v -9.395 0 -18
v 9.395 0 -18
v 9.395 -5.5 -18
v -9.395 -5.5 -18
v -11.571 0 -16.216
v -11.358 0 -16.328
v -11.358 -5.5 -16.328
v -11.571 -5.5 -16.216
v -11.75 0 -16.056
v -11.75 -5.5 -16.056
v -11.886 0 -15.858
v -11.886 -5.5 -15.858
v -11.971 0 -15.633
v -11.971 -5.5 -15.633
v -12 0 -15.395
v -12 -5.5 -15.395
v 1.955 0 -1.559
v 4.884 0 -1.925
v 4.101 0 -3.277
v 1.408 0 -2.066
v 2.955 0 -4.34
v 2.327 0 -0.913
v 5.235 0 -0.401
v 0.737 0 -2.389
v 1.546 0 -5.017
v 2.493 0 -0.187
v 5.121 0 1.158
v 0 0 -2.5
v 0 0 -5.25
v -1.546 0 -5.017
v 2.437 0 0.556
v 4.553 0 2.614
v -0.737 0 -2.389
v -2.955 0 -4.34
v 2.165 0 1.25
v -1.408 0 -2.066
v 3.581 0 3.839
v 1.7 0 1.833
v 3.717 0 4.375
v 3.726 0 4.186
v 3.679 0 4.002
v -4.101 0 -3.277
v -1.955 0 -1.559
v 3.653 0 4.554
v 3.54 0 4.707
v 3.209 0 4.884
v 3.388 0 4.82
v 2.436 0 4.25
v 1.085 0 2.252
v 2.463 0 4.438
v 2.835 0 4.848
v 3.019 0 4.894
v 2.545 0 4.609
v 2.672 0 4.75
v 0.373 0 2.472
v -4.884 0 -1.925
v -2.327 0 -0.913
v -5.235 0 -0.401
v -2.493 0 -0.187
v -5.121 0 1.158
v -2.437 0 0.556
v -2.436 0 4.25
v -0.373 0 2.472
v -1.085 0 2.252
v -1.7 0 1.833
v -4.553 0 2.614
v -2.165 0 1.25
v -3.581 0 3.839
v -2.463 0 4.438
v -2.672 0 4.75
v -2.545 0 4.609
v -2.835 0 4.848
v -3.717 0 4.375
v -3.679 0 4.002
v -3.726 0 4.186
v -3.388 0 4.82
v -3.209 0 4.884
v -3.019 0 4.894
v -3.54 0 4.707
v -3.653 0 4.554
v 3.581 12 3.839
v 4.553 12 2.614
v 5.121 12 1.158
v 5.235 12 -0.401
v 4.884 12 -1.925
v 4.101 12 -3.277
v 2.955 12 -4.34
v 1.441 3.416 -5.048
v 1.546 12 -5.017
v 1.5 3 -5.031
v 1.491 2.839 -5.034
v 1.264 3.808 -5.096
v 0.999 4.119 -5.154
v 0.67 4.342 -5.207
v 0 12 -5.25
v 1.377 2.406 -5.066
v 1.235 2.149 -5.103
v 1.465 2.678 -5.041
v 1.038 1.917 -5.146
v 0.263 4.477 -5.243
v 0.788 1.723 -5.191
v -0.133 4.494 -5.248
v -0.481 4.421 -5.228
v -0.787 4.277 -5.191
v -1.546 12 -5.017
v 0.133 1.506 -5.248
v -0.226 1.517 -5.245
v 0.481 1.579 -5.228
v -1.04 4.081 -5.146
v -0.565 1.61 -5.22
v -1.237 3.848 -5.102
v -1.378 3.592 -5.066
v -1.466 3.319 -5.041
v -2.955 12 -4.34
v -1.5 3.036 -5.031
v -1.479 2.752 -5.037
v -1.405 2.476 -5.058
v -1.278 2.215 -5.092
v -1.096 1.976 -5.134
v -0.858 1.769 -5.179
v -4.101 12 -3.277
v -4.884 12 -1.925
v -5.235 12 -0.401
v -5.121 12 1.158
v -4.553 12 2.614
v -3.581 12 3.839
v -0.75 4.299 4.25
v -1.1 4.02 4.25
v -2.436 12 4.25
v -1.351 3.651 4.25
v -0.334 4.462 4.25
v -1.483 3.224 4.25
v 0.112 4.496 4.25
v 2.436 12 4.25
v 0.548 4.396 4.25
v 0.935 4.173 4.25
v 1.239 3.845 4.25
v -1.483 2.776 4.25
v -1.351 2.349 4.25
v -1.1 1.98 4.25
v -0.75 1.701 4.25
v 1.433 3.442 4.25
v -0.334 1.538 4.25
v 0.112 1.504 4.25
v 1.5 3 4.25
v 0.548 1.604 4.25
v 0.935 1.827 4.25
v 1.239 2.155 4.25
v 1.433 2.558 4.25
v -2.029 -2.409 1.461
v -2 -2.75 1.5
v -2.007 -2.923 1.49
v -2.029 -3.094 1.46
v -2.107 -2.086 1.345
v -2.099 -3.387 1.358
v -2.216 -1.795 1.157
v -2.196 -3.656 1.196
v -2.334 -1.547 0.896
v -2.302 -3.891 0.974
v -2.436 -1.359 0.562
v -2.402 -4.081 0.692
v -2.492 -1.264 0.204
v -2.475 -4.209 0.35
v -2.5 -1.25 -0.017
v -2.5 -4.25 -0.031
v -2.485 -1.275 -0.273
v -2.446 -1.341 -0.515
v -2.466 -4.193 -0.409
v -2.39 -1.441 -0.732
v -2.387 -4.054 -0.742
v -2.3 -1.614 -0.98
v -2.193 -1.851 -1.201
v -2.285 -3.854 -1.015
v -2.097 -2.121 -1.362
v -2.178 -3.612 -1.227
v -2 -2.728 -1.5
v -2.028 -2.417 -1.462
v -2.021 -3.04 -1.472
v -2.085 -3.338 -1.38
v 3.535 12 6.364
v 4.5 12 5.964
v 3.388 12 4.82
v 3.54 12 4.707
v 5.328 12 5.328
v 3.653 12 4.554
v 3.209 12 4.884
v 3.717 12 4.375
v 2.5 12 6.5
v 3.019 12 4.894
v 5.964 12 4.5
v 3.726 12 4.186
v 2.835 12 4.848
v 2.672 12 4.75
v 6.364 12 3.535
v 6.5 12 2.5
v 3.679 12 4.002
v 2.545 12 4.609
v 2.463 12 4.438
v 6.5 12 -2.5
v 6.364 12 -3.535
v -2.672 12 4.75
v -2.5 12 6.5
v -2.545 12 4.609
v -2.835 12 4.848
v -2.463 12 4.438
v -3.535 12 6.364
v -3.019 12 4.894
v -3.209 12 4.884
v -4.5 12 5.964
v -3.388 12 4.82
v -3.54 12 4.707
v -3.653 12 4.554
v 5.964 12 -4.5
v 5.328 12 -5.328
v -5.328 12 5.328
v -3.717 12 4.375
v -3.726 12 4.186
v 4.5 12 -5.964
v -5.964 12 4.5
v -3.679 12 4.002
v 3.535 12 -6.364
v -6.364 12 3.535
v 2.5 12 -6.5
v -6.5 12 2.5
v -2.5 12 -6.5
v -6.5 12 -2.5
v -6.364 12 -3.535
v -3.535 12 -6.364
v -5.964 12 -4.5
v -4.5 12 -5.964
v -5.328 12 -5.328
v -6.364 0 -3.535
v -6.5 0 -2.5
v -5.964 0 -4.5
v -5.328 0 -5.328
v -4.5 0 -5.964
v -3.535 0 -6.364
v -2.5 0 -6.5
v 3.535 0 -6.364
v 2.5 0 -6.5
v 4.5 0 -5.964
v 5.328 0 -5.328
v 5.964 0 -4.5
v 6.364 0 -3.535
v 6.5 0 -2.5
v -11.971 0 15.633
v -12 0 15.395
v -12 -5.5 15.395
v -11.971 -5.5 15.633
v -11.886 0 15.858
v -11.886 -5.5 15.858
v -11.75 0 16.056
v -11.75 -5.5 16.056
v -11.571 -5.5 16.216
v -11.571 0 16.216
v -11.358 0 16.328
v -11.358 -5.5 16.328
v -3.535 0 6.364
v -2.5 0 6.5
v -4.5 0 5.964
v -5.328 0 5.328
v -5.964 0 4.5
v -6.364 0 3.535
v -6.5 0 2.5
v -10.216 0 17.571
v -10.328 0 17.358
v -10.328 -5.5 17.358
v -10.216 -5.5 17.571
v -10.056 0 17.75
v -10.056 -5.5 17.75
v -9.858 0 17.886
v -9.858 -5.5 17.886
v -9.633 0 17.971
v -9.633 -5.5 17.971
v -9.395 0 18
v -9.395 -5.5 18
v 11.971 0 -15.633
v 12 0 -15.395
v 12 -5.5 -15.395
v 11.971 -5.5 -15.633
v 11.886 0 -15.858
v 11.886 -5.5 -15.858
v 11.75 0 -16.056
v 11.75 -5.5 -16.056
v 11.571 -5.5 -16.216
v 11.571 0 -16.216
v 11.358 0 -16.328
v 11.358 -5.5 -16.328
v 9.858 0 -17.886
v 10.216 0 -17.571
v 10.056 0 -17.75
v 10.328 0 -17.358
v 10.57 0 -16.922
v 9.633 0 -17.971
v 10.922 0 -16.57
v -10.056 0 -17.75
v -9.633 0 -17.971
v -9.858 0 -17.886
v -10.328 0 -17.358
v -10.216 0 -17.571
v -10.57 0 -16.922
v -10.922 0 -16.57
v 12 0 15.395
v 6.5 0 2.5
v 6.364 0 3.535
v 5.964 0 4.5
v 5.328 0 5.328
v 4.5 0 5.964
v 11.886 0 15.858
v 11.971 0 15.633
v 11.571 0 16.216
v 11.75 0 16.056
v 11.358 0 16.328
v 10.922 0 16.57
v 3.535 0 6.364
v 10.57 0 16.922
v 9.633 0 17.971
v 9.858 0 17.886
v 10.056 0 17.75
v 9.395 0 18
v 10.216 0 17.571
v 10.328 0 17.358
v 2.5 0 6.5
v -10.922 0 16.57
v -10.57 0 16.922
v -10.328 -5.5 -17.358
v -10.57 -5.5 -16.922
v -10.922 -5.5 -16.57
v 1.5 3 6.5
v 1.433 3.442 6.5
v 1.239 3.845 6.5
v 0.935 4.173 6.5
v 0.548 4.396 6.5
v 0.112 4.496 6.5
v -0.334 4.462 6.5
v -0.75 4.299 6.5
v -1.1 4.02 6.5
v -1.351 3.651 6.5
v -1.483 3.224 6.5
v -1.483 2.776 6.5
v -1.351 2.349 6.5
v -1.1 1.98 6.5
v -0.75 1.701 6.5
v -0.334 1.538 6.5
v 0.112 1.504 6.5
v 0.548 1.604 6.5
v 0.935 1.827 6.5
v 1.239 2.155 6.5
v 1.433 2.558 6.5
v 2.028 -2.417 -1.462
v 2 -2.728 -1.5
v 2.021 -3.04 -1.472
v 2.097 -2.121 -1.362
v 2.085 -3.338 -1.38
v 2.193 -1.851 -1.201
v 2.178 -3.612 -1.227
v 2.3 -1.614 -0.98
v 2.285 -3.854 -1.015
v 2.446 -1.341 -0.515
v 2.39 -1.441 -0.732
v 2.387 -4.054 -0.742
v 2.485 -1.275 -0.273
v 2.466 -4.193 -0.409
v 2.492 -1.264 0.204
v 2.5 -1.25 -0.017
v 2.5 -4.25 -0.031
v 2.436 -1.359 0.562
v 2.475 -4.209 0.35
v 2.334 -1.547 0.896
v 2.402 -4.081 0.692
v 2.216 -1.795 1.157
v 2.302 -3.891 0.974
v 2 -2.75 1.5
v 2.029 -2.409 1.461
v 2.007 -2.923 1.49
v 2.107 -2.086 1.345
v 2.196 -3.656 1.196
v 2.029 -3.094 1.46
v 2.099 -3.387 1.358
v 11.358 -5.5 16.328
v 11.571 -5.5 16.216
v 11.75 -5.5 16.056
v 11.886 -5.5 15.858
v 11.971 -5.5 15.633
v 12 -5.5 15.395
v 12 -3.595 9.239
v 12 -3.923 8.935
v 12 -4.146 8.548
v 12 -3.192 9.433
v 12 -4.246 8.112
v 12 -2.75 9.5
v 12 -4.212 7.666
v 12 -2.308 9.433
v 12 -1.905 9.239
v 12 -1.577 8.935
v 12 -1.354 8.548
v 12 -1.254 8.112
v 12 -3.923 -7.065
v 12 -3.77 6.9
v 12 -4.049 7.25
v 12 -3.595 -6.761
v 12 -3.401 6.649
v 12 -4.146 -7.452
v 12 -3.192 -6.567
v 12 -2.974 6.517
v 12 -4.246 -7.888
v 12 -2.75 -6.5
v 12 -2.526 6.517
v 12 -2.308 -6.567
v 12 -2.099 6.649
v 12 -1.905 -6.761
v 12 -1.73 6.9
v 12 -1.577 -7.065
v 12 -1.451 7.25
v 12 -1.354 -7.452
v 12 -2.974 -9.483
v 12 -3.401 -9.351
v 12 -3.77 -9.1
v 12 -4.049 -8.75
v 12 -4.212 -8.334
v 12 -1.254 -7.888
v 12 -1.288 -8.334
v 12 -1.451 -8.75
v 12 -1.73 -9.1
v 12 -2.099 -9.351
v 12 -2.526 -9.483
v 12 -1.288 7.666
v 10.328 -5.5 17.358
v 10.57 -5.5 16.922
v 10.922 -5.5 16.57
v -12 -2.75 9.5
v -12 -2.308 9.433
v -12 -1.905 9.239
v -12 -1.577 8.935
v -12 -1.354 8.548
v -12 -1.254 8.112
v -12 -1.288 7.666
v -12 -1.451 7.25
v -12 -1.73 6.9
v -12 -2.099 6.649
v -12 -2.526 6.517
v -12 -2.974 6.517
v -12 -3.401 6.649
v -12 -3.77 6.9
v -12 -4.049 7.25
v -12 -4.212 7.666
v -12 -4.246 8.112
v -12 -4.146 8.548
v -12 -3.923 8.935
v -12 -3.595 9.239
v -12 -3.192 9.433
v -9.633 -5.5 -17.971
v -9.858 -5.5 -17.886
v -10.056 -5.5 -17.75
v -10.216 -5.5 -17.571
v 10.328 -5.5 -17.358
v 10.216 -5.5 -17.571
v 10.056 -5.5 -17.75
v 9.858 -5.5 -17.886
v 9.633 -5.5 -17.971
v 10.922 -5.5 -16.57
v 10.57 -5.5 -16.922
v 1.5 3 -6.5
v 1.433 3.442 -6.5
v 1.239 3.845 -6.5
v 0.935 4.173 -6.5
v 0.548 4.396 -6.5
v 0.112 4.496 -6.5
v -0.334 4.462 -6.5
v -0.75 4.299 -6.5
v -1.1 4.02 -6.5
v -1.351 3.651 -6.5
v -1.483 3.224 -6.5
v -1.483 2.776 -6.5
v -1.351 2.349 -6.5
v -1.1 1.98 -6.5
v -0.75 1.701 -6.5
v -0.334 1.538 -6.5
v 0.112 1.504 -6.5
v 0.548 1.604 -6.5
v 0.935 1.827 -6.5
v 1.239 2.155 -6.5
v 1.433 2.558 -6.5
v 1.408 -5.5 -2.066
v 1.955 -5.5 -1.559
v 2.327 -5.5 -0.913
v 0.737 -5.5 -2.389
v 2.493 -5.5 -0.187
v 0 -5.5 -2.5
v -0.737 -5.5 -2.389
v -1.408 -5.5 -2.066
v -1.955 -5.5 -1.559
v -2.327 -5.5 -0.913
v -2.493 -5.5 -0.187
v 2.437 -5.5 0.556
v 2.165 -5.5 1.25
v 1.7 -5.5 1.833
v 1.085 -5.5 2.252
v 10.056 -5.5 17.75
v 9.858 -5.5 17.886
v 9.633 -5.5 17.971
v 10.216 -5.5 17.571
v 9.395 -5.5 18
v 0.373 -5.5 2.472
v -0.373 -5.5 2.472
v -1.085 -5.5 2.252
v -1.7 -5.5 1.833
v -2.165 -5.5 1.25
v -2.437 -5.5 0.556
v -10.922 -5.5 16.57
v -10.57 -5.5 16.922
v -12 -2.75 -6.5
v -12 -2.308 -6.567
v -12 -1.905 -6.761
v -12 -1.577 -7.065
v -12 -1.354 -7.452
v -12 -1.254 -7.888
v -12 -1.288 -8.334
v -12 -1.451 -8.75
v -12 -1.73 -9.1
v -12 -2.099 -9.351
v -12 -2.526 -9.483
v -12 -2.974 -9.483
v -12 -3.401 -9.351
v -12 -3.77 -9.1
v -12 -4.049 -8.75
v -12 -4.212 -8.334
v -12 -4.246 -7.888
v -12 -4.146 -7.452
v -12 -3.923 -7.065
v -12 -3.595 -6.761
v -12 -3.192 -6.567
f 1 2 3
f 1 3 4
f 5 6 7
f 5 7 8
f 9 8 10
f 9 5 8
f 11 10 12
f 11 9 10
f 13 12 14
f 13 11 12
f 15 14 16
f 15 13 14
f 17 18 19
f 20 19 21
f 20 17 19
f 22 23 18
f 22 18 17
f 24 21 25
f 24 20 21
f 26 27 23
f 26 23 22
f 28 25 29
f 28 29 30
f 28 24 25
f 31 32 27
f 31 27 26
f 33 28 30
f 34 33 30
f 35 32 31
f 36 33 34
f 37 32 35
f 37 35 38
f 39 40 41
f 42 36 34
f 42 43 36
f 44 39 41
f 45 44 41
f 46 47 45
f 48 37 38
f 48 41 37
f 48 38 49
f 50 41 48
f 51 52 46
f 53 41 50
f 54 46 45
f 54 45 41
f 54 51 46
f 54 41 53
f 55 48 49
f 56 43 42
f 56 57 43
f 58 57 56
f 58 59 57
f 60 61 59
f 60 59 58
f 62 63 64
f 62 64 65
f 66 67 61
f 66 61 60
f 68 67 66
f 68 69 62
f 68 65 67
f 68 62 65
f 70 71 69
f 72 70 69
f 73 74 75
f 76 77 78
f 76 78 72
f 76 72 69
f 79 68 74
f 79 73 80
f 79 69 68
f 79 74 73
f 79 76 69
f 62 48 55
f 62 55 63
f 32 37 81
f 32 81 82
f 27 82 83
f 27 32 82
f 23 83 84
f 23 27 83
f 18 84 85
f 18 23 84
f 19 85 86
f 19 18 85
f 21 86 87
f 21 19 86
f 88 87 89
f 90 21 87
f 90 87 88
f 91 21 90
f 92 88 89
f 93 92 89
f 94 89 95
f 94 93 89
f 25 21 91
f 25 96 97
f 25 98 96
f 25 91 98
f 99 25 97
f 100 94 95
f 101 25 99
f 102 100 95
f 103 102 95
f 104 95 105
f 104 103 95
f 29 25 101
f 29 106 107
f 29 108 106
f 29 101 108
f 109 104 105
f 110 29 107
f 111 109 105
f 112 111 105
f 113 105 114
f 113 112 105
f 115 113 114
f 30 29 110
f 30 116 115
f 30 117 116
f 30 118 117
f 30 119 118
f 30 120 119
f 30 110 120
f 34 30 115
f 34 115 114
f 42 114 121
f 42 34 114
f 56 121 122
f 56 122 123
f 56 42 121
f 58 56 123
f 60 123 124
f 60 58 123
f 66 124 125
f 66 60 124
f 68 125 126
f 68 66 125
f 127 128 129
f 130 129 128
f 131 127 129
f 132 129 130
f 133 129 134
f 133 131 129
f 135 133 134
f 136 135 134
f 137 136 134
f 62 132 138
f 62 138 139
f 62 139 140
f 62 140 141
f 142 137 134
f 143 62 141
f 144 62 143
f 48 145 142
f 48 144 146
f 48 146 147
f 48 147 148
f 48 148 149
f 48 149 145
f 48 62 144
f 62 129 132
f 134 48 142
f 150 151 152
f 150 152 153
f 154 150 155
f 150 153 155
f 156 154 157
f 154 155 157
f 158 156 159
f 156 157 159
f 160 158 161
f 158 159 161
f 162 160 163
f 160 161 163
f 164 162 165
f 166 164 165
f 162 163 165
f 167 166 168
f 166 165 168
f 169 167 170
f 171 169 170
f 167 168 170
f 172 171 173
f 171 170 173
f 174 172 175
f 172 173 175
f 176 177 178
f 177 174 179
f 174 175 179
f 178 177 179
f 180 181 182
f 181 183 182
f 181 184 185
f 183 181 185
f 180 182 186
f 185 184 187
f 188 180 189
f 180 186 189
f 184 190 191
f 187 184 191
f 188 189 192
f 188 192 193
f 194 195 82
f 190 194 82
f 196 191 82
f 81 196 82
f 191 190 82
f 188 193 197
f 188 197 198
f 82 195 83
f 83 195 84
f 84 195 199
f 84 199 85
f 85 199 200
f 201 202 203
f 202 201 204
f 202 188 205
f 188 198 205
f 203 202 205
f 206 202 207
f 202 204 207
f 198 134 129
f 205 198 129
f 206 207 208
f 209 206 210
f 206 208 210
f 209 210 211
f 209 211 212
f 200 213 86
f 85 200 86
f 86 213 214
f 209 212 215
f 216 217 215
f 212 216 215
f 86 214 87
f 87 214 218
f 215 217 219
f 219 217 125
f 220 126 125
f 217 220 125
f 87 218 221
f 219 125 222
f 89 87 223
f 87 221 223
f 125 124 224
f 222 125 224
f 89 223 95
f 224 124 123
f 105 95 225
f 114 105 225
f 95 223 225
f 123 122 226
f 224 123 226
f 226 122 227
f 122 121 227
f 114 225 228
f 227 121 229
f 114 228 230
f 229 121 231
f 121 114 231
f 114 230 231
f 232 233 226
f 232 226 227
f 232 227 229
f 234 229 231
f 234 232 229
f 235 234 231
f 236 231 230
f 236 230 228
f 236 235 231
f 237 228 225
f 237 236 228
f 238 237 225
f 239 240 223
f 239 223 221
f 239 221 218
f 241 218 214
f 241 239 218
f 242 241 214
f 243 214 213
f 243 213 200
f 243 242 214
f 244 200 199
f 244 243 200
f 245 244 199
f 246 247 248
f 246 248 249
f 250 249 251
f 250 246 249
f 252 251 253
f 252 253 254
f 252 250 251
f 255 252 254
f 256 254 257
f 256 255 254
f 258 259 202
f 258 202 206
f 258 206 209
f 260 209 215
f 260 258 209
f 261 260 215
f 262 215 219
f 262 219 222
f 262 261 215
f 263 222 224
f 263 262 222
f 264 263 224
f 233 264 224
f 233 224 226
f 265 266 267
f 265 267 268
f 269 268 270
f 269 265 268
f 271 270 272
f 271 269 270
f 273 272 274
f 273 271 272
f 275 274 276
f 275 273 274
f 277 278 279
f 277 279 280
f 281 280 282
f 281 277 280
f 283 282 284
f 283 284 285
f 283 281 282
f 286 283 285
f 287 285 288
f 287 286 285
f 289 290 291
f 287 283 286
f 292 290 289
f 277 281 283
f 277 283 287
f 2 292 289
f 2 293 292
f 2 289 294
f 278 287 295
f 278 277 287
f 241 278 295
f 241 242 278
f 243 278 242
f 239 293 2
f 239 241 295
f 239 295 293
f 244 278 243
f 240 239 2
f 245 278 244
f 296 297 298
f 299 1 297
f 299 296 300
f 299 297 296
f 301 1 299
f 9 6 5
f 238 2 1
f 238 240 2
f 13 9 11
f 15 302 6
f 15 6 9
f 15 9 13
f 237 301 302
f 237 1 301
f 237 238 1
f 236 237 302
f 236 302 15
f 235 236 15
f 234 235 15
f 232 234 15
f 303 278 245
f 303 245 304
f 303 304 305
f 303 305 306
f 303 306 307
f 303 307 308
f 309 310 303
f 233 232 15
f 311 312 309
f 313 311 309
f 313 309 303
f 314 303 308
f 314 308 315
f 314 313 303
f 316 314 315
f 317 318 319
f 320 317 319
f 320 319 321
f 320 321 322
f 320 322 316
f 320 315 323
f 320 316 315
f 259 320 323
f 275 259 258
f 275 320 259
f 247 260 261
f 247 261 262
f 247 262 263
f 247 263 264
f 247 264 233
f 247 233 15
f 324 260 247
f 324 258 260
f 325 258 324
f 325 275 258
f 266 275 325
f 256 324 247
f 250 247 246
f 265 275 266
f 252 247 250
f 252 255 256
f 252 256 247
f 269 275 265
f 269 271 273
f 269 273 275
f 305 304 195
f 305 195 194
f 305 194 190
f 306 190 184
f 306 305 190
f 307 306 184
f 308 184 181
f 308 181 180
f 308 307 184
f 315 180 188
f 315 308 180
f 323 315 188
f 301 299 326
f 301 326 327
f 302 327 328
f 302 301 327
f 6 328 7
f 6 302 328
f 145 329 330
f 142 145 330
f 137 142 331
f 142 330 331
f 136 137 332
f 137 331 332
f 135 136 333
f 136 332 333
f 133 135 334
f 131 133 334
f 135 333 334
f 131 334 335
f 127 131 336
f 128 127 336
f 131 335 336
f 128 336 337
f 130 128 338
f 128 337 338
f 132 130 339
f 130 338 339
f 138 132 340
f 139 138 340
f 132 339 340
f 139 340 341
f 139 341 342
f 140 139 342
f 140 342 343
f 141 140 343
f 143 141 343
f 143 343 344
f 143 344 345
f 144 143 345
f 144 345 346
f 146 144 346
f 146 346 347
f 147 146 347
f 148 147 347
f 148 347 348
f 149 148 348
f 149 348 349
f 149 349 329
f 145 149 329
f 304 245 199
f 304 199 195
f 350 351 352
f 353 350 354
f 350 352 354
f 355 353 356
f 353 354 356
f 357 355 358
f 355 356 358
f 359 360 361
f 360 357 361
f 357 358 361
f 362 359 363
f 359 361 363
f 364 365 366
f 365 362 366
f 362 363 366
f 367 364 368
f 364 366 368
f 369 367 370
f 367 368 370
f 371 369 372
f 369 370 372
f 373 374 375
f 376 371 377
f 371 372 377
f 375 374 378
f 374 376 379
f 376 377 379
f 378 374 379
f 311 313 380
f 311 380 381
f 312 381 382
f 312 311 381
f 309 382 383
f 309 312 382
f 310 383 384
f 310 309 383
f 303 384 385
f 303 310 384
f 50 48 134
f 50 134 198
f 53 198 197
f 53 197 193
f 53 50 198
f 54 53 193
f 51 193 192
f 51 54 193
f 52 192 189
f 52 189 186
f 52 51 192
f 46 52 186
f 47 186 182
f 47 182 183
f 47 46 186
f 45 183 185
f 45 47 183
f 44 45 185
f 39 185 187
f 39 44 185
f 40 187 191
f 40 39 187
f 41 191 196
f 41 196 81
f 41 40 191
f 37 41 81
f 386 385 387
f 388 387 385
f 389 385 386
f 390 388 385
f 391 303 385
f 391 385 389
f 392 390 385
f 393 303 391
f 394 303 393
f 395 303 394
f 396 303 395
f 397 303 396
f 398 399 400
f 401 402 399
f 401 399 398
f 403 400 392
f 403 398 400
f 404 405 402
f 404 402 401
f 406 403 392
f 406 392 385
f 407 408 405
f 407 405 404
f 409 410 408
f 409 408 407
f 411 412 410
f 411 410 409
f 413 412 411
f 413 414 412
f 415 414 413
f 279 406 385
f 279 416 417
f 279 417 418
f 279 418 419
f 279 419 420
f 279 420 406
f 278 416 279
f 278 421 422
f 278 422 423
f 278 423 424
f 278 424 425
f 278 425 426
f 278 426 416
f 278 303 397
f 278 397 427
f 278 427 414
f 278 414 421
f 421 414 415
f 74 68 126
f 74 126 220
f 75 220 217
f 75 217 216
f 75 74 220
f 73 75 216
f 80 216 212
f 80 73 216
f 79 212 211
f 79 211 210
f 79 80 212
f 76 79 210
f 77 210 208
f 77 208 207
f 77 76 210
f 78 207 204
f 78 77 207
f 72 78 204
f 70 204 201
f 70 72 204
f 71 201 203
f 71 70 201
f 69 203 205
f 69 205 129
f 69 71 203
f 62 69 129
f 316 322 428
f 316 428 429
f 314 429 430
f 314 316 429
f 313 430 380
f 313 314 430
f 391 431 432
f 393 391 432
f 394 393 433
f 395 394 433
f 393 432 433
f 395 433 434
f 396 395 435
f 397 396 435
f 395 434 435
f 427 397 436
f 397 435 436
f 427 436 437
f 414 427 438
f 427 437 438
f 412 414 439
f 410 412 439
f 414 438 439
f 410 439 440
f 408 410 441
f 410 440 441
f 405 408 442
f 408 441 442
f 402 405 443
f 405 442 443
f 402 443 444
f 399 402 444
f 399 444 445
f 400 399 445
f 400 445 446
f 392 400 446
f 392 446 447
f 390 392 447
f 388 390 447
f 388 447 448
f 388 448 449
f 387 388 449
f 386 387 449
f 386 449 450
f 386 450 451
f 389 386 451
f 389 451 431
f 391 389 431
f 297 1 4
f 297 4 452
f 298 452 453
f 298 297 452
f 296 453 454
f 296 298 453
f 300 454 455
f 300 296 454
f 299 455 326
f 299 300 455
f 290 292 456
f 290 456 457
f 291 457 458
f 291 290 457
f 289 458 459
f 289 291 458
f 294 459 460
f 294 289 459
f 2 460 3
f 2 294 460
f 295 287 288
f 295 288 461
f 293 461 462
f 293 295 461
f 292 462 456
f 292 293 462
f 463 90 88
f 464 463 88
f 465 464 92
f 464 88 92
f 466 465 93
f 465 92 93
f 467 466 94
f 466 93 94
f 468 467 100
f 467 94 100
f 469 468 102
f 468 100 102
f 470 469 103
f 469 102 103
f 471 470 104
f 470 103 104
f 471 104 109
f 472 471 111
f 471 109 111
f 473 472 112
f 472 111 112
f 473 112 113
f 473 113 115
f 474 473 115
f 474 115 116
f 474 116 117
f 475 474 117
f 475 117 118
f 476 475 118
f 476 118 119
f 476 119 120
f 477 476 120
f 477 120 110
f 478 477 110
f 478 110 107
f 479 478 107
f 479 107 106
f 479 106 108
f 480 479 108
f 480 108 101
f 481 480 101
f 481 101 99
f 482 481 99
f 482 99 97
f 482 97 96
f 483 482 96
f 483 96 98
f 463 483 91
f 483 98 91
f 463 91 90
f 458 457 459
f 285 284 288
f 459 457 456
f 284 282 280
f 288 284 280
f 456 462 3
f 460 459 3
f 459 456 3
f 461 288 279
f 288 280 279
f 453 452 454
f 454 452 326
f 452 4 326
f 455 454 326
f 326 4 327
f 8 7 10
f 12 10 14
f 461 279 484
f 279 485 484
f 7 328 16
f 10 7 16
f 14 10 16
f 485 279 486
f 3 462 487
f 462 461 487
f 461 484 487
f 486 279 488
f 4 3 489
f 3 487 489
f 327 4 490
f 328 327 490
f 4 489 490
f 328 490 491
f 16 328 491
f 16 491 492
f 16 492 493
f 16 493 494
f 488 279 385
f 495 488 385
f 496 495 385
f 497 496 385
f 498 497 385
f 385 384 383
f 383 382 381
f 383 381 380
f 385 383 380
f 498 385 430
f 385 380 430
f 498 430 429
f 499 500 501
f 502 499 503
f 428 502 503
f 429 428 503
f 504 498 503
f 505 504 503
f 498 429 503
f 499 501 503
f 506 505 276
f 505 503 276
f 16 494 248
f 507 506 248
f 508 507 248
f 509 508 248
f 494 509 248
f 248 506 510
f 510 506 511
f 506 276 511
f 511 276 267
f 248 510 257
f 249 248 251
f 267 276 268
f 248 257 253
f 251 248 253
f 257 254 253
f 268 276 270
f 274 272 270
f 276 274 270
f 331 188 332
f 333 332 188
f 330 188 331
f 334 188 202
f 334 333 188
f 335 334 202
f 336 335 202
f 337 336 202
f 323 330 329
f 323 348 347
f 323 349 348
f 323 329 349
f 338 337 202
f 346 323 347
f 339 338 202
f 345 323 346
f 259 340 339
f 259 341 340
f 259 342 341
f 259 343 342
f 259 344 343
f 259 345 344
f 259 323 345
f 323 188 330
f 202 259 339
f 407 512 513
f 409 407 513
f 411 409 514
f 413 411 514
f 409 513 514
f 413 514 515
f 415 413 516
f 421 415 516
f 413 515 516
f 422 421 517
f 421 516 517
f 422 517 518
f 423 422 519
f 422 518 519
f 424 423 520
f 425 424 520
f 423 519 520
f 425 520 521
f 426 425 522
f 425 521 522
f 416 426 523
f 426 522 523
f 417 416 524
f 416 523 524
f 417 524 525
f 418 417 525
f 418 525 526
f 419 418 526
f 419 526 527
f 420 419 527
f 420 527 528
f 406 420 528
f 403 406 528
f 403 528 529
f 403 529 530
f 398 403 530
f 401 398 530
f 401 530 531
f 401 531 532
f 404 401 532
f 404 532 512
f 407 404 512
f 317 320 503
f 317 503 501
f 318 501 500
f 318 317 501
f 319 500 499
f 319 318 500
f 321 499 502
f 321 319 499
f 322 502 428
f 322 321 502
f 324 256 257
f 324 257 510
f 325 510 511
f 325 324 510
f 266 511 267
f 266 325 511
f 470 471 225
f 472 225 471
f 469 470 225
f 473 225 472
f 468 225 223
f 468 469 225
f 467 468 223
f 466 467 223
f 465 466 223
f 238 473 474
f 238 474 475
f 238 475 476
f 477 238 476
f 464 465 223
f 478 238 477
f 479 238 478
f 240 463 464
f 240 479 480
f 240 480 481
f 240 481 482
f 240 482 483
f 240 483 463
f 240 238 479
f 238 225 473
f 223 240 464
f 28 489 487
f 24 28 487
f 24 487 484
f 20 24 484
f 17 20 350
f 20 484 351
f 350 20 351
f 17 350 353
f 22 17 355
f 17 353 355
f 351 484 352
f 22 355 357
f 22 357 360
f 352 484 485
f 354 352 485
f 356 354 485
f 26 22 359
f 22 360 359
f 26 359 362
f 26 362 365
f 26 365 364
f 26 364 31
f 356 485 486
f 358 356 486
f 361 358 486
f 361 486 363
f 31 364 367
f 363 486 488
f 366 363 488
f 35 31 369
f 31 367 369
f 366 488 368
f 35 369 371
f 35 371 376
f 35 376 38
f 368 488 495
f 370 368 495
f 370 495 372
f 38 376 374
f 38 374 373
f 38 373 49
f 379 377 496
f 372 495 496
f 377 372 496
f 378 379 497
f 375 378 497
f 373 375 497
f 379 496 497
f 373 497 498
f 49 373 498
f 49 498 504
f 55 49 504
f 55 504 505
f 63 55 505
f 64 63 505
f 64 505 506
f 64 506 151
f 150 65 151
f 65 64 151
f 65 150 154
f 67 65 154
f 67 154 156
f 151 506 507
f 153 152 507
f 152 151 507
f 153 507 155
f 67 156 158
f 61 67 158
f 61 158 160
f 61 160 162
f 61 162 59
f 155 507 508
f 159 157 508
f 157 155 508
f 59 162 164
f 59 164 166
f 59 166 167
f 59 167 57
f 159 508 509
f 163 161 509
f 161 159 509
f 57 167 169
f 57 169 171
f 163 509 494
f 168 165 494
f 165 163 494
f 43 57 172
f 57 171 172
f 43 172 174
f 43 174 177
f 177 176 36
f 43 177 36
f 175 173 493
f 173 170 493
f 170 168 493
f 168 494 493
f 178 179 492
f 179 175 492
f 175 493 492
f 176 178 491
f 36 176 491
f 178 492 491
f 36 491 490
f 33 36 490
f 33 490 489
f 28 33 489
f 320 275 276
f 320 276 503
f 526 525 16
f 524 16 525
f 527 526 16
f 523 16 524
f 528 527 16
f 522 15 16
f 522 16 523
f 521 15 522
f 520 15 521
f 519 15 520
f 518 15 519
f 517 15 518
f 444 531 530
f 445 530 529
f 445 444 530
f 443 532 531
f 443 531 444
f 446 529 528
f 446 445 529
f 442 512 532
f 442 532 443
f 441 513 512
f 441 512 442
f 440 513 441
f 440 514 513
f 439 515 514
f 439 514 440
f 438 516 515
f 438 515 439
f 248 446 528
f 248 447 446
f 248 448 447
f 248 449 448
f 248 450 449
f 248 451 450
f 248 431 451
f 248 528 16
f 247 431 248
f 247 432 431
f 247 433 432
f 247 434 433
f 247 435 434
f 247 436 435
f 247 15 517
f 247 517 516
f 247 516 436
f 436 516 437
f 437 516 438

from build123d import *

# Parameters (mm, degrees)
EXTRUDE_1_DEPTH     = 12
EXTRUDE_3_DEPTH     = 5.5
SKETCH_6_R          = 1.5
CUT_EXTRUDE_2_DEPTH = 31
SKETCH_7_R          = 1.5
CUT_EXTRUDE_3_DEPTH = 31
SKETCH_8_R          = 2.5
CUT_EXTRUDE_5_DEPTH = 31
EXTRUDE_START       = -24
SKETCH_9_R          = 1.5
EXTRUDE_4_DEPTH     = 24
SKETCH_10_R         = 2.5
CUT_EXTRUDE_6_DEPTH = 24


with BuildPart() as part:
    # 草图1 → 凸台-拉伸1 (new body)
    with BuildSketch(Plane(origin=(0, 0, 0), x_dir=(1, 0, 0), z_dir=(0, 1, 0))):
        with BuildLine():
            ThreePointArc((6.5, -2.5), (5.328427125, -5.328427125), (2.5, -6.5))
            Line((2.5, -6.5), (-2.5, -6.5))
            ThreePointArc((-2.5, -6.5), (-5.328427125, -5.328427125), (-6.5, -2.5))
            Line((-6.5, -2.5), (-6.5, 2.5))
            ThreePointArc((-6.5, 2.5), (-5.328427125, 5.328427125), (-2.5, 6.5))
            Line((-2.5, 6.5), (2.5, 6.5))
            ThreePointArc((2.5, 6.5), (5.328427125, 5.328427125), (6.5, 2.5))
            Line((6.5, 2.5), (6.5, -2.5))
        make_face()
        with BuildLine():
            ThreePointArc((3.581278005, -3.838873253), (0, 5.25), (-3.581278005, -3.838873253))
            ThreePointArc((-3.581278005, -3.838873253), (-3.300605298, -4.858604348), (-2.435602742, -4.25))
            Line((-2.435602742, -4.25), (2.435602742, -4.25))
            ThreePointArc((2.435602742, -4.25), (3.300605298, -4.858604348), (3.581278005, -3.838873253))
        make_face(mode=Mode.SUBTRACT)
    extrude(amount=EXTRUDE_1_DEPTH)

    # 草图3 → 凸台-拉伸3 (add)
    with BuildSketch(Plane.XZ):
        with BuildLine():
            Line((12, 15.394651328), (12, -15.394651328))
            ThreePointArc((12, -15.394651328), (11.824116747, -15.961071302), (11.358336826, -16.328243701))
            ThreePointArc((11.358336826, -16.328243701), (10.733804764, -16.733804764), (10.328243701, -17.358336826))
            ThreePointArc((10.328243701, -17.358336826), (9.961071302, -17.824116747), (9.394651328, -18))
            Line((9.394651328, -18), (-9.394651328, -18))
            ThreePointArc((-9.394651328, -18), (-9.961071302, -17.824116747), (-10.328243701, -17.358336826))
            ThreePointArc((-10.328243701, -17.358336826), (-10.733804764, -16.733804764), (-11.358336826, -16.328243701))
            ThreePointArc((-11.358336826, -16.328243701), (-11.824116747, -15.961071302), (-12, -15.394651328))
            Line((-12, -15.394651328), (-12, 15.394651328))
            ThreePointArc((-12, 15.394651328), (-11.824116747, 15.961071302), (-11.358336826, 16.328243701))
            ThreePointArc((-11.358336826, 16.328243701), (-10.733804764, 16.733804764), (-10.328243701, 17.358336826))
            ThreePointArc((-10.328243701, 17.358336826), (-9.961071302, 17.824116747), (-9.394651328, 18))
            Line((-9.394651328, 18), (9.394651328, 18))
            ThreePointArc((9.394651328, 18), (9.961071302, 17.824116747), (10.328243701, 17.358336826))
            ThreePointArc((10.328243701, 17.358336826), (10.733804764, 16.733804764), (11.358336826, 16.328243701))
            ThreePointArc((11.358336826, 16.328243701), (11.824116747, 15.961071302), (12, 15.394651328))
        make_face()
    extrude(amount=EXTRUDE_3_DEPTH)

    # 草图6 → 切除-拉伸2 (cut)
    with BuildSketch(Plane.ZY.offset(12)):
        with Locations((0, -2.75)):
            Circle(SKETCH_6_R)
        with Locations((8, -2.75)):
            Circle(SKETCH_6_R)
        with Locations((-8, -2.75)):
            Circle(SKETCH_6_R)
    extrude(amount=-CUT_EXTRUDE_2_DEPTH, mode=Mode.SUBTRACT)

    # 草图7 → 切除-拉伸3 (cut)
    with BuildSketch(Plane.XY.offset(6.5)):
        with Locations((0, 3)):
            Circle(SKETCH_7_R)
    extrude(amount=-CUT_EXTRUDE_3_DEPTH, mode=Mode.SUBTRACT)

    # 草图8 → 切除-拉伸5 (cut)
    with BuildSketch(Plane.XZ.offset(5.5)):
        with Locations(Location((0, 0, 0), (0, 0, 270))):
            Circle(SKETCH_8_R)
    extrude(amount=-CUT_EXTRUDE_5_DEPTH, mode=Mode.SUBTRACT)

    # 草图9 → 凸台-拉伸4 (add)
    with BuildSketch(Plane(origin=(12, 0, 0), x_dir=(0, 0, -1), z_dir=(1, 0, 0)).offset(EXTRUDE_START)):
        with Locations(Location((0, -2.75, 0), (0, 0, 180))):
            Circle(SKETCH_9_R)
    extrude(amount=EXTRUDE_4_DEPTH)

    # 草图10 → 切除-拉伸6 (cut)
    with BuildSketch(Plane.XZ.offset(5.5)):
        with Locations(Location((0, 0, 0), (0, 0, 270))):
            Circle(SKETCH_10_R)
    extrude(amount=-CUT_EXTRUDE_6_DEPTH, mode=Mode.SUBTRACT)


solid = part.part
